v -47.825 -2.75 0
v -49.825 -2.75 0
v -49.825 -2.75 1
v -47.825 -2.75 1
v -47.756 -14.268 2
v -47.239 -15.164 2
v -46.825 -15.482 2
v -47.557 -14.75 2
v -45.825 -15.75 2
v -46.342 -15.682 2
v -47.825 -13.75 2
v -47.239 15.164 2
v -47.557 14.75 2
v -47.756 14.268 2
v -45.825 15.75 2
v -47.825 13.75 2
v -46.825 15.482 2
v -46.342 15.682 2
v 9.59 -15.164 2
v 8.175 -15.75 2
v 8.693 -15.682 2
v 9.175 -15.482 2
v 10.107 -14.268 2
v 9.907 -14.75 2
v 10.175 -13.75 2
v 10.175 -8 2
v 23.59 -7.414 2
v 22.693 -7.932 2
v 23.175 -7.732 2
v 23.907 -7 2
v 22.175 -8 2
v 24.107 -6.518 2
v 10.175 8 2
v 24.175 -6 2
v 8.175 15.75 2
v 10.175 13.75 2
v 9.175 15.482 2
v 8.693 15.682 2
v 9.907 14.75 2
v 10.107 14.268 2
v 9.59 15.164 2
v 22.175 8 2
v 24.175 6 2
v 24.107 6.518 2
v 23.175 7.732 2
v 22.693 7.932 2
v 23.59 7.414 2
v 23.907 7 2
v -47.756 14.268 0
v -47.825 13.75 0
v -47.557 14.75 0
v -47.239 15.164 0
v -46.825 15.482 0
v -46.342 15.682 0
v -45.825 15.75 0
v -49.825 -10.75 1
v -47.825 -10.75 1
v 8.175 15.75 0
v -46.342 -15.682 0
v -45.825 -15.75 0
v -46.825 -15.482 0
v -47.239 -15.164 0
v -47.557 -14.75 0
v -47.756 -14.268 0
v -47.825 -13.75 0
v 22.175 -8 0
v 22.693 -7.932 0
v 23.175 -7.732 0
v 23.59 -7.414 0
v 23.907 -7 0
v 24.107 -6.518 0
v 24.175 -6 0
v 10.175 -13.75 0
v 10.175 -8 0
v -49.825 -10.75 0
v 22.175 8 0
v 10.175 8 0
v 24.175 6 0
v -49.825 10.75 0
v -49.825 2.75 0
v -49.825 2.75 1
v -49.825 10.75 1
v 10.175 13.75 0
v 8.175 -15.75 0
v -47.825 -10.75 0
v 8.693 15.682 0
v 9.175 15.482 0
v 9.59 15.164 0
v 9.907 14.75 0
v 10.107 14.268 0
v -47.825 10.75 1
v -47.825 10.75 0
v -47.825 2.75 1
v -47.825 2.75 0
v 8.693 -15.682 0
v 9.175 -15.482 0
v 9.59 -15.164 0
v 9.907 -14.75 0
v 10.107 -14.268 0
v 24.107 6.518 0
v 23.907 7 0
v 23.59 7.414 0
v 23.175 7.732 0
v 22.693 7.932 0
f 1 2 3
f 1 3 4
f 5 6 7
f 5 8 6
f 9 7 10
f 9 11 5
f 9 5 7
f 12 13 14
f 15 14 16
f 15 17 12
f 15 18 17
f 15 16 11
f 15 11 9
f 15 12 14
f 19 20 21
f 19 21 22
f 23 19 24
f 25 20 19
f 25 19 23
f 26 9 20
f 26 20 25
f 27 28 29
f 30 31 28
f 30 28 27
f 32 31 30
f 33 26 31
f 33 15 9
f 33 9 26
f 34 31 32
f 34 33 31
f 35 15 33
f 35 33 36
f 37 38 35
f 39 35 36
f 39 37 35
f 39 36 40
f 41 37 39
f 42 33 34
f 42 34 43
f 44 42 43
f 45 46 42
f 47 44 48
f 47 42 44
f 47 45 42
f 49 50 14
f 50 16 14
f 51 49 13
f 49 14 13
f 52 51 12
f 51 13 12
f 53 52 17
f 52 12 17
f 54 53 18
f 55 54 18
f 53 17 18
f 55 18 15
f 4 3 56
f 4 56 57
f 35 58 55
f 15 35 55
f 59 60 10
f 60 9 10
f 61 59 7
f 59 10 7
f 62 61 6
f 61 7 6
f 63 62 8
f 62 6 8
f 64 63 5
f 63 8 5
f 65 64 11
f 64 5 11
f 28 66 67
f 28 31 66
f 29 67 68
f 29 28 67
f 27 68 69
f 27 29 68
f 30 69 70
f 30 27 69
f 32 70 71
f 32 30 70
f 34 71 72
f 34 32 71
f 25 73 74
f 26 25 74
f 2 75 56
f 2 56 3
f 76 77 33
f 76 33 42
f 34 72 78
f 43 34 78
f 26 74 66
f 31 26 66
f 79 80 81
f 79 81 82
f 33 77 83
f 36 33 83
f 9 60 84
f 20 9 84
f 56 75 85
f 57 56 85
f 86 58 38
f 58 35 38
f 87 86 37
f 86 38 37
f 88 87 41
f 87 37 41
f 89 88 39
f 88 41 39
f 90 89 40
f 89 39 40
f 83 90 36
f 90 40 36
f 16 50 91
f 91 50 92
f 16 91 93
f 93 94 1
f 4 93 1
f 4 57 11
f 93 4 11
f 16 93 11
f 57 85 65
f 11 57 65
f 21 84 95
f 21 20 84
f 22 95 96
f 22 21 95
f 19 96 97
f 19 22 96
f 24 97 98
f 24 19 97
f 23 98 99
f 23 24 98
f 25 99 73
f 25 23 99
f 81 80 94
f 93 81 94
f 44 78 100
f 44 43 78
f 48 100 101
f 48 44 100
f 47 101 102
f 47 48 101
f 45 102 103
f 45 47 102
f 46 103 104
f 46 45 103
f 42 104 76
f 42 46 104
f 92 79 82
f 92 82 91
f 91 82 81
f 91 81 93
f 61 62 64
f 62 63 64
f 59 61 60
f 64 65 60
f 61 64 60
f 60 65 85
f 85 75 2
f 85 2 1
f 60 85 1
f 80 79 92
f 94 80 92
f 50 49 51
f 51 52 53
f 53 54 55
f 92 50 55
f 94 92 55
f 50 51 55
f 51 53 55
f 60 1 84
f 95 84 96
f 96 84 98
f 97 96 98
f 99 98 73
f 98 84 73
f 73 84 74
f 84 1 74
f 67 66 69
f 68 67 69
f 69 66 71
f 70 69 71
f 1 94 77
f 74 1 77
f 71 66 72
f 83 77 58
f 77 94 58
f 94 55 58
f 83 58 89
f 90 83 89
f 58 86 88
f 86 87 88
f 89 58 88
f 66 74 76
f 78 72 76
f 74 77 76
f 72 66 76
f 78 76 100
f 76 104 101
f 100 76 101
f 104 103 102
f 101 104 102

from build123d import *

# Parameters (mm, degrees)
F0_W     = 14
F0_H     = 16
F1_DEPTH = 2
F0_W_2   = 2
F0_H_2   = 8
F2_DEPTH = 1
F3_R     = 2


with BuildPart() as f1:
    # F0 (on Top) → F1 (new body)
    with BuildSketch(Plane.XY):
        Polygon((-47.824564, -15.75), (10.175436, -15.75), (10.175436, -8), (-3.824564, -8), (-3.824564, 8), (10.175436, 8), (10.175436, 15.75), (-47.824564, 15.75), (-47.824564, 10.75), (-47.824564, 2.75), (-47.824564, -2.75), (-47.824564, -10.75), align=None)
        with Locations((3.175436, 0)):
            Rectangle(F0_W, F0_H)
        with Locations((17.175436, 0)):
            Rectangle(F0_W, F0_H)
    extrude(amount=F1_DEPTH)

    # F0 (on Top) → F2 (join)
    with BuildSketch(Plane.XY):
        with Locations((-48.824564, 6.75)):
            Rectangle(F0_W_2, F0_H_2)
        with Locations((-48.824564, -6.75)):
            Rectangle(F0_W_2, F0_H_2)
    extrude(amount=F2_DEPTH)

    # F3
    f3_edges = [f1.edges().sort_by_distance(p)[0] for p in [
        (10.175436, 15.75, 1),
        (24.175436, 8, 1),
        (24.175436, -8, 1),
        (10.175436, -15.75, 1),
        (-47.824564, -15.75, 1),
        (-47.824564, 15.75, 1),
    ]]
    fillet(f3_edges, radius=F3_R)


solid = f1.part
